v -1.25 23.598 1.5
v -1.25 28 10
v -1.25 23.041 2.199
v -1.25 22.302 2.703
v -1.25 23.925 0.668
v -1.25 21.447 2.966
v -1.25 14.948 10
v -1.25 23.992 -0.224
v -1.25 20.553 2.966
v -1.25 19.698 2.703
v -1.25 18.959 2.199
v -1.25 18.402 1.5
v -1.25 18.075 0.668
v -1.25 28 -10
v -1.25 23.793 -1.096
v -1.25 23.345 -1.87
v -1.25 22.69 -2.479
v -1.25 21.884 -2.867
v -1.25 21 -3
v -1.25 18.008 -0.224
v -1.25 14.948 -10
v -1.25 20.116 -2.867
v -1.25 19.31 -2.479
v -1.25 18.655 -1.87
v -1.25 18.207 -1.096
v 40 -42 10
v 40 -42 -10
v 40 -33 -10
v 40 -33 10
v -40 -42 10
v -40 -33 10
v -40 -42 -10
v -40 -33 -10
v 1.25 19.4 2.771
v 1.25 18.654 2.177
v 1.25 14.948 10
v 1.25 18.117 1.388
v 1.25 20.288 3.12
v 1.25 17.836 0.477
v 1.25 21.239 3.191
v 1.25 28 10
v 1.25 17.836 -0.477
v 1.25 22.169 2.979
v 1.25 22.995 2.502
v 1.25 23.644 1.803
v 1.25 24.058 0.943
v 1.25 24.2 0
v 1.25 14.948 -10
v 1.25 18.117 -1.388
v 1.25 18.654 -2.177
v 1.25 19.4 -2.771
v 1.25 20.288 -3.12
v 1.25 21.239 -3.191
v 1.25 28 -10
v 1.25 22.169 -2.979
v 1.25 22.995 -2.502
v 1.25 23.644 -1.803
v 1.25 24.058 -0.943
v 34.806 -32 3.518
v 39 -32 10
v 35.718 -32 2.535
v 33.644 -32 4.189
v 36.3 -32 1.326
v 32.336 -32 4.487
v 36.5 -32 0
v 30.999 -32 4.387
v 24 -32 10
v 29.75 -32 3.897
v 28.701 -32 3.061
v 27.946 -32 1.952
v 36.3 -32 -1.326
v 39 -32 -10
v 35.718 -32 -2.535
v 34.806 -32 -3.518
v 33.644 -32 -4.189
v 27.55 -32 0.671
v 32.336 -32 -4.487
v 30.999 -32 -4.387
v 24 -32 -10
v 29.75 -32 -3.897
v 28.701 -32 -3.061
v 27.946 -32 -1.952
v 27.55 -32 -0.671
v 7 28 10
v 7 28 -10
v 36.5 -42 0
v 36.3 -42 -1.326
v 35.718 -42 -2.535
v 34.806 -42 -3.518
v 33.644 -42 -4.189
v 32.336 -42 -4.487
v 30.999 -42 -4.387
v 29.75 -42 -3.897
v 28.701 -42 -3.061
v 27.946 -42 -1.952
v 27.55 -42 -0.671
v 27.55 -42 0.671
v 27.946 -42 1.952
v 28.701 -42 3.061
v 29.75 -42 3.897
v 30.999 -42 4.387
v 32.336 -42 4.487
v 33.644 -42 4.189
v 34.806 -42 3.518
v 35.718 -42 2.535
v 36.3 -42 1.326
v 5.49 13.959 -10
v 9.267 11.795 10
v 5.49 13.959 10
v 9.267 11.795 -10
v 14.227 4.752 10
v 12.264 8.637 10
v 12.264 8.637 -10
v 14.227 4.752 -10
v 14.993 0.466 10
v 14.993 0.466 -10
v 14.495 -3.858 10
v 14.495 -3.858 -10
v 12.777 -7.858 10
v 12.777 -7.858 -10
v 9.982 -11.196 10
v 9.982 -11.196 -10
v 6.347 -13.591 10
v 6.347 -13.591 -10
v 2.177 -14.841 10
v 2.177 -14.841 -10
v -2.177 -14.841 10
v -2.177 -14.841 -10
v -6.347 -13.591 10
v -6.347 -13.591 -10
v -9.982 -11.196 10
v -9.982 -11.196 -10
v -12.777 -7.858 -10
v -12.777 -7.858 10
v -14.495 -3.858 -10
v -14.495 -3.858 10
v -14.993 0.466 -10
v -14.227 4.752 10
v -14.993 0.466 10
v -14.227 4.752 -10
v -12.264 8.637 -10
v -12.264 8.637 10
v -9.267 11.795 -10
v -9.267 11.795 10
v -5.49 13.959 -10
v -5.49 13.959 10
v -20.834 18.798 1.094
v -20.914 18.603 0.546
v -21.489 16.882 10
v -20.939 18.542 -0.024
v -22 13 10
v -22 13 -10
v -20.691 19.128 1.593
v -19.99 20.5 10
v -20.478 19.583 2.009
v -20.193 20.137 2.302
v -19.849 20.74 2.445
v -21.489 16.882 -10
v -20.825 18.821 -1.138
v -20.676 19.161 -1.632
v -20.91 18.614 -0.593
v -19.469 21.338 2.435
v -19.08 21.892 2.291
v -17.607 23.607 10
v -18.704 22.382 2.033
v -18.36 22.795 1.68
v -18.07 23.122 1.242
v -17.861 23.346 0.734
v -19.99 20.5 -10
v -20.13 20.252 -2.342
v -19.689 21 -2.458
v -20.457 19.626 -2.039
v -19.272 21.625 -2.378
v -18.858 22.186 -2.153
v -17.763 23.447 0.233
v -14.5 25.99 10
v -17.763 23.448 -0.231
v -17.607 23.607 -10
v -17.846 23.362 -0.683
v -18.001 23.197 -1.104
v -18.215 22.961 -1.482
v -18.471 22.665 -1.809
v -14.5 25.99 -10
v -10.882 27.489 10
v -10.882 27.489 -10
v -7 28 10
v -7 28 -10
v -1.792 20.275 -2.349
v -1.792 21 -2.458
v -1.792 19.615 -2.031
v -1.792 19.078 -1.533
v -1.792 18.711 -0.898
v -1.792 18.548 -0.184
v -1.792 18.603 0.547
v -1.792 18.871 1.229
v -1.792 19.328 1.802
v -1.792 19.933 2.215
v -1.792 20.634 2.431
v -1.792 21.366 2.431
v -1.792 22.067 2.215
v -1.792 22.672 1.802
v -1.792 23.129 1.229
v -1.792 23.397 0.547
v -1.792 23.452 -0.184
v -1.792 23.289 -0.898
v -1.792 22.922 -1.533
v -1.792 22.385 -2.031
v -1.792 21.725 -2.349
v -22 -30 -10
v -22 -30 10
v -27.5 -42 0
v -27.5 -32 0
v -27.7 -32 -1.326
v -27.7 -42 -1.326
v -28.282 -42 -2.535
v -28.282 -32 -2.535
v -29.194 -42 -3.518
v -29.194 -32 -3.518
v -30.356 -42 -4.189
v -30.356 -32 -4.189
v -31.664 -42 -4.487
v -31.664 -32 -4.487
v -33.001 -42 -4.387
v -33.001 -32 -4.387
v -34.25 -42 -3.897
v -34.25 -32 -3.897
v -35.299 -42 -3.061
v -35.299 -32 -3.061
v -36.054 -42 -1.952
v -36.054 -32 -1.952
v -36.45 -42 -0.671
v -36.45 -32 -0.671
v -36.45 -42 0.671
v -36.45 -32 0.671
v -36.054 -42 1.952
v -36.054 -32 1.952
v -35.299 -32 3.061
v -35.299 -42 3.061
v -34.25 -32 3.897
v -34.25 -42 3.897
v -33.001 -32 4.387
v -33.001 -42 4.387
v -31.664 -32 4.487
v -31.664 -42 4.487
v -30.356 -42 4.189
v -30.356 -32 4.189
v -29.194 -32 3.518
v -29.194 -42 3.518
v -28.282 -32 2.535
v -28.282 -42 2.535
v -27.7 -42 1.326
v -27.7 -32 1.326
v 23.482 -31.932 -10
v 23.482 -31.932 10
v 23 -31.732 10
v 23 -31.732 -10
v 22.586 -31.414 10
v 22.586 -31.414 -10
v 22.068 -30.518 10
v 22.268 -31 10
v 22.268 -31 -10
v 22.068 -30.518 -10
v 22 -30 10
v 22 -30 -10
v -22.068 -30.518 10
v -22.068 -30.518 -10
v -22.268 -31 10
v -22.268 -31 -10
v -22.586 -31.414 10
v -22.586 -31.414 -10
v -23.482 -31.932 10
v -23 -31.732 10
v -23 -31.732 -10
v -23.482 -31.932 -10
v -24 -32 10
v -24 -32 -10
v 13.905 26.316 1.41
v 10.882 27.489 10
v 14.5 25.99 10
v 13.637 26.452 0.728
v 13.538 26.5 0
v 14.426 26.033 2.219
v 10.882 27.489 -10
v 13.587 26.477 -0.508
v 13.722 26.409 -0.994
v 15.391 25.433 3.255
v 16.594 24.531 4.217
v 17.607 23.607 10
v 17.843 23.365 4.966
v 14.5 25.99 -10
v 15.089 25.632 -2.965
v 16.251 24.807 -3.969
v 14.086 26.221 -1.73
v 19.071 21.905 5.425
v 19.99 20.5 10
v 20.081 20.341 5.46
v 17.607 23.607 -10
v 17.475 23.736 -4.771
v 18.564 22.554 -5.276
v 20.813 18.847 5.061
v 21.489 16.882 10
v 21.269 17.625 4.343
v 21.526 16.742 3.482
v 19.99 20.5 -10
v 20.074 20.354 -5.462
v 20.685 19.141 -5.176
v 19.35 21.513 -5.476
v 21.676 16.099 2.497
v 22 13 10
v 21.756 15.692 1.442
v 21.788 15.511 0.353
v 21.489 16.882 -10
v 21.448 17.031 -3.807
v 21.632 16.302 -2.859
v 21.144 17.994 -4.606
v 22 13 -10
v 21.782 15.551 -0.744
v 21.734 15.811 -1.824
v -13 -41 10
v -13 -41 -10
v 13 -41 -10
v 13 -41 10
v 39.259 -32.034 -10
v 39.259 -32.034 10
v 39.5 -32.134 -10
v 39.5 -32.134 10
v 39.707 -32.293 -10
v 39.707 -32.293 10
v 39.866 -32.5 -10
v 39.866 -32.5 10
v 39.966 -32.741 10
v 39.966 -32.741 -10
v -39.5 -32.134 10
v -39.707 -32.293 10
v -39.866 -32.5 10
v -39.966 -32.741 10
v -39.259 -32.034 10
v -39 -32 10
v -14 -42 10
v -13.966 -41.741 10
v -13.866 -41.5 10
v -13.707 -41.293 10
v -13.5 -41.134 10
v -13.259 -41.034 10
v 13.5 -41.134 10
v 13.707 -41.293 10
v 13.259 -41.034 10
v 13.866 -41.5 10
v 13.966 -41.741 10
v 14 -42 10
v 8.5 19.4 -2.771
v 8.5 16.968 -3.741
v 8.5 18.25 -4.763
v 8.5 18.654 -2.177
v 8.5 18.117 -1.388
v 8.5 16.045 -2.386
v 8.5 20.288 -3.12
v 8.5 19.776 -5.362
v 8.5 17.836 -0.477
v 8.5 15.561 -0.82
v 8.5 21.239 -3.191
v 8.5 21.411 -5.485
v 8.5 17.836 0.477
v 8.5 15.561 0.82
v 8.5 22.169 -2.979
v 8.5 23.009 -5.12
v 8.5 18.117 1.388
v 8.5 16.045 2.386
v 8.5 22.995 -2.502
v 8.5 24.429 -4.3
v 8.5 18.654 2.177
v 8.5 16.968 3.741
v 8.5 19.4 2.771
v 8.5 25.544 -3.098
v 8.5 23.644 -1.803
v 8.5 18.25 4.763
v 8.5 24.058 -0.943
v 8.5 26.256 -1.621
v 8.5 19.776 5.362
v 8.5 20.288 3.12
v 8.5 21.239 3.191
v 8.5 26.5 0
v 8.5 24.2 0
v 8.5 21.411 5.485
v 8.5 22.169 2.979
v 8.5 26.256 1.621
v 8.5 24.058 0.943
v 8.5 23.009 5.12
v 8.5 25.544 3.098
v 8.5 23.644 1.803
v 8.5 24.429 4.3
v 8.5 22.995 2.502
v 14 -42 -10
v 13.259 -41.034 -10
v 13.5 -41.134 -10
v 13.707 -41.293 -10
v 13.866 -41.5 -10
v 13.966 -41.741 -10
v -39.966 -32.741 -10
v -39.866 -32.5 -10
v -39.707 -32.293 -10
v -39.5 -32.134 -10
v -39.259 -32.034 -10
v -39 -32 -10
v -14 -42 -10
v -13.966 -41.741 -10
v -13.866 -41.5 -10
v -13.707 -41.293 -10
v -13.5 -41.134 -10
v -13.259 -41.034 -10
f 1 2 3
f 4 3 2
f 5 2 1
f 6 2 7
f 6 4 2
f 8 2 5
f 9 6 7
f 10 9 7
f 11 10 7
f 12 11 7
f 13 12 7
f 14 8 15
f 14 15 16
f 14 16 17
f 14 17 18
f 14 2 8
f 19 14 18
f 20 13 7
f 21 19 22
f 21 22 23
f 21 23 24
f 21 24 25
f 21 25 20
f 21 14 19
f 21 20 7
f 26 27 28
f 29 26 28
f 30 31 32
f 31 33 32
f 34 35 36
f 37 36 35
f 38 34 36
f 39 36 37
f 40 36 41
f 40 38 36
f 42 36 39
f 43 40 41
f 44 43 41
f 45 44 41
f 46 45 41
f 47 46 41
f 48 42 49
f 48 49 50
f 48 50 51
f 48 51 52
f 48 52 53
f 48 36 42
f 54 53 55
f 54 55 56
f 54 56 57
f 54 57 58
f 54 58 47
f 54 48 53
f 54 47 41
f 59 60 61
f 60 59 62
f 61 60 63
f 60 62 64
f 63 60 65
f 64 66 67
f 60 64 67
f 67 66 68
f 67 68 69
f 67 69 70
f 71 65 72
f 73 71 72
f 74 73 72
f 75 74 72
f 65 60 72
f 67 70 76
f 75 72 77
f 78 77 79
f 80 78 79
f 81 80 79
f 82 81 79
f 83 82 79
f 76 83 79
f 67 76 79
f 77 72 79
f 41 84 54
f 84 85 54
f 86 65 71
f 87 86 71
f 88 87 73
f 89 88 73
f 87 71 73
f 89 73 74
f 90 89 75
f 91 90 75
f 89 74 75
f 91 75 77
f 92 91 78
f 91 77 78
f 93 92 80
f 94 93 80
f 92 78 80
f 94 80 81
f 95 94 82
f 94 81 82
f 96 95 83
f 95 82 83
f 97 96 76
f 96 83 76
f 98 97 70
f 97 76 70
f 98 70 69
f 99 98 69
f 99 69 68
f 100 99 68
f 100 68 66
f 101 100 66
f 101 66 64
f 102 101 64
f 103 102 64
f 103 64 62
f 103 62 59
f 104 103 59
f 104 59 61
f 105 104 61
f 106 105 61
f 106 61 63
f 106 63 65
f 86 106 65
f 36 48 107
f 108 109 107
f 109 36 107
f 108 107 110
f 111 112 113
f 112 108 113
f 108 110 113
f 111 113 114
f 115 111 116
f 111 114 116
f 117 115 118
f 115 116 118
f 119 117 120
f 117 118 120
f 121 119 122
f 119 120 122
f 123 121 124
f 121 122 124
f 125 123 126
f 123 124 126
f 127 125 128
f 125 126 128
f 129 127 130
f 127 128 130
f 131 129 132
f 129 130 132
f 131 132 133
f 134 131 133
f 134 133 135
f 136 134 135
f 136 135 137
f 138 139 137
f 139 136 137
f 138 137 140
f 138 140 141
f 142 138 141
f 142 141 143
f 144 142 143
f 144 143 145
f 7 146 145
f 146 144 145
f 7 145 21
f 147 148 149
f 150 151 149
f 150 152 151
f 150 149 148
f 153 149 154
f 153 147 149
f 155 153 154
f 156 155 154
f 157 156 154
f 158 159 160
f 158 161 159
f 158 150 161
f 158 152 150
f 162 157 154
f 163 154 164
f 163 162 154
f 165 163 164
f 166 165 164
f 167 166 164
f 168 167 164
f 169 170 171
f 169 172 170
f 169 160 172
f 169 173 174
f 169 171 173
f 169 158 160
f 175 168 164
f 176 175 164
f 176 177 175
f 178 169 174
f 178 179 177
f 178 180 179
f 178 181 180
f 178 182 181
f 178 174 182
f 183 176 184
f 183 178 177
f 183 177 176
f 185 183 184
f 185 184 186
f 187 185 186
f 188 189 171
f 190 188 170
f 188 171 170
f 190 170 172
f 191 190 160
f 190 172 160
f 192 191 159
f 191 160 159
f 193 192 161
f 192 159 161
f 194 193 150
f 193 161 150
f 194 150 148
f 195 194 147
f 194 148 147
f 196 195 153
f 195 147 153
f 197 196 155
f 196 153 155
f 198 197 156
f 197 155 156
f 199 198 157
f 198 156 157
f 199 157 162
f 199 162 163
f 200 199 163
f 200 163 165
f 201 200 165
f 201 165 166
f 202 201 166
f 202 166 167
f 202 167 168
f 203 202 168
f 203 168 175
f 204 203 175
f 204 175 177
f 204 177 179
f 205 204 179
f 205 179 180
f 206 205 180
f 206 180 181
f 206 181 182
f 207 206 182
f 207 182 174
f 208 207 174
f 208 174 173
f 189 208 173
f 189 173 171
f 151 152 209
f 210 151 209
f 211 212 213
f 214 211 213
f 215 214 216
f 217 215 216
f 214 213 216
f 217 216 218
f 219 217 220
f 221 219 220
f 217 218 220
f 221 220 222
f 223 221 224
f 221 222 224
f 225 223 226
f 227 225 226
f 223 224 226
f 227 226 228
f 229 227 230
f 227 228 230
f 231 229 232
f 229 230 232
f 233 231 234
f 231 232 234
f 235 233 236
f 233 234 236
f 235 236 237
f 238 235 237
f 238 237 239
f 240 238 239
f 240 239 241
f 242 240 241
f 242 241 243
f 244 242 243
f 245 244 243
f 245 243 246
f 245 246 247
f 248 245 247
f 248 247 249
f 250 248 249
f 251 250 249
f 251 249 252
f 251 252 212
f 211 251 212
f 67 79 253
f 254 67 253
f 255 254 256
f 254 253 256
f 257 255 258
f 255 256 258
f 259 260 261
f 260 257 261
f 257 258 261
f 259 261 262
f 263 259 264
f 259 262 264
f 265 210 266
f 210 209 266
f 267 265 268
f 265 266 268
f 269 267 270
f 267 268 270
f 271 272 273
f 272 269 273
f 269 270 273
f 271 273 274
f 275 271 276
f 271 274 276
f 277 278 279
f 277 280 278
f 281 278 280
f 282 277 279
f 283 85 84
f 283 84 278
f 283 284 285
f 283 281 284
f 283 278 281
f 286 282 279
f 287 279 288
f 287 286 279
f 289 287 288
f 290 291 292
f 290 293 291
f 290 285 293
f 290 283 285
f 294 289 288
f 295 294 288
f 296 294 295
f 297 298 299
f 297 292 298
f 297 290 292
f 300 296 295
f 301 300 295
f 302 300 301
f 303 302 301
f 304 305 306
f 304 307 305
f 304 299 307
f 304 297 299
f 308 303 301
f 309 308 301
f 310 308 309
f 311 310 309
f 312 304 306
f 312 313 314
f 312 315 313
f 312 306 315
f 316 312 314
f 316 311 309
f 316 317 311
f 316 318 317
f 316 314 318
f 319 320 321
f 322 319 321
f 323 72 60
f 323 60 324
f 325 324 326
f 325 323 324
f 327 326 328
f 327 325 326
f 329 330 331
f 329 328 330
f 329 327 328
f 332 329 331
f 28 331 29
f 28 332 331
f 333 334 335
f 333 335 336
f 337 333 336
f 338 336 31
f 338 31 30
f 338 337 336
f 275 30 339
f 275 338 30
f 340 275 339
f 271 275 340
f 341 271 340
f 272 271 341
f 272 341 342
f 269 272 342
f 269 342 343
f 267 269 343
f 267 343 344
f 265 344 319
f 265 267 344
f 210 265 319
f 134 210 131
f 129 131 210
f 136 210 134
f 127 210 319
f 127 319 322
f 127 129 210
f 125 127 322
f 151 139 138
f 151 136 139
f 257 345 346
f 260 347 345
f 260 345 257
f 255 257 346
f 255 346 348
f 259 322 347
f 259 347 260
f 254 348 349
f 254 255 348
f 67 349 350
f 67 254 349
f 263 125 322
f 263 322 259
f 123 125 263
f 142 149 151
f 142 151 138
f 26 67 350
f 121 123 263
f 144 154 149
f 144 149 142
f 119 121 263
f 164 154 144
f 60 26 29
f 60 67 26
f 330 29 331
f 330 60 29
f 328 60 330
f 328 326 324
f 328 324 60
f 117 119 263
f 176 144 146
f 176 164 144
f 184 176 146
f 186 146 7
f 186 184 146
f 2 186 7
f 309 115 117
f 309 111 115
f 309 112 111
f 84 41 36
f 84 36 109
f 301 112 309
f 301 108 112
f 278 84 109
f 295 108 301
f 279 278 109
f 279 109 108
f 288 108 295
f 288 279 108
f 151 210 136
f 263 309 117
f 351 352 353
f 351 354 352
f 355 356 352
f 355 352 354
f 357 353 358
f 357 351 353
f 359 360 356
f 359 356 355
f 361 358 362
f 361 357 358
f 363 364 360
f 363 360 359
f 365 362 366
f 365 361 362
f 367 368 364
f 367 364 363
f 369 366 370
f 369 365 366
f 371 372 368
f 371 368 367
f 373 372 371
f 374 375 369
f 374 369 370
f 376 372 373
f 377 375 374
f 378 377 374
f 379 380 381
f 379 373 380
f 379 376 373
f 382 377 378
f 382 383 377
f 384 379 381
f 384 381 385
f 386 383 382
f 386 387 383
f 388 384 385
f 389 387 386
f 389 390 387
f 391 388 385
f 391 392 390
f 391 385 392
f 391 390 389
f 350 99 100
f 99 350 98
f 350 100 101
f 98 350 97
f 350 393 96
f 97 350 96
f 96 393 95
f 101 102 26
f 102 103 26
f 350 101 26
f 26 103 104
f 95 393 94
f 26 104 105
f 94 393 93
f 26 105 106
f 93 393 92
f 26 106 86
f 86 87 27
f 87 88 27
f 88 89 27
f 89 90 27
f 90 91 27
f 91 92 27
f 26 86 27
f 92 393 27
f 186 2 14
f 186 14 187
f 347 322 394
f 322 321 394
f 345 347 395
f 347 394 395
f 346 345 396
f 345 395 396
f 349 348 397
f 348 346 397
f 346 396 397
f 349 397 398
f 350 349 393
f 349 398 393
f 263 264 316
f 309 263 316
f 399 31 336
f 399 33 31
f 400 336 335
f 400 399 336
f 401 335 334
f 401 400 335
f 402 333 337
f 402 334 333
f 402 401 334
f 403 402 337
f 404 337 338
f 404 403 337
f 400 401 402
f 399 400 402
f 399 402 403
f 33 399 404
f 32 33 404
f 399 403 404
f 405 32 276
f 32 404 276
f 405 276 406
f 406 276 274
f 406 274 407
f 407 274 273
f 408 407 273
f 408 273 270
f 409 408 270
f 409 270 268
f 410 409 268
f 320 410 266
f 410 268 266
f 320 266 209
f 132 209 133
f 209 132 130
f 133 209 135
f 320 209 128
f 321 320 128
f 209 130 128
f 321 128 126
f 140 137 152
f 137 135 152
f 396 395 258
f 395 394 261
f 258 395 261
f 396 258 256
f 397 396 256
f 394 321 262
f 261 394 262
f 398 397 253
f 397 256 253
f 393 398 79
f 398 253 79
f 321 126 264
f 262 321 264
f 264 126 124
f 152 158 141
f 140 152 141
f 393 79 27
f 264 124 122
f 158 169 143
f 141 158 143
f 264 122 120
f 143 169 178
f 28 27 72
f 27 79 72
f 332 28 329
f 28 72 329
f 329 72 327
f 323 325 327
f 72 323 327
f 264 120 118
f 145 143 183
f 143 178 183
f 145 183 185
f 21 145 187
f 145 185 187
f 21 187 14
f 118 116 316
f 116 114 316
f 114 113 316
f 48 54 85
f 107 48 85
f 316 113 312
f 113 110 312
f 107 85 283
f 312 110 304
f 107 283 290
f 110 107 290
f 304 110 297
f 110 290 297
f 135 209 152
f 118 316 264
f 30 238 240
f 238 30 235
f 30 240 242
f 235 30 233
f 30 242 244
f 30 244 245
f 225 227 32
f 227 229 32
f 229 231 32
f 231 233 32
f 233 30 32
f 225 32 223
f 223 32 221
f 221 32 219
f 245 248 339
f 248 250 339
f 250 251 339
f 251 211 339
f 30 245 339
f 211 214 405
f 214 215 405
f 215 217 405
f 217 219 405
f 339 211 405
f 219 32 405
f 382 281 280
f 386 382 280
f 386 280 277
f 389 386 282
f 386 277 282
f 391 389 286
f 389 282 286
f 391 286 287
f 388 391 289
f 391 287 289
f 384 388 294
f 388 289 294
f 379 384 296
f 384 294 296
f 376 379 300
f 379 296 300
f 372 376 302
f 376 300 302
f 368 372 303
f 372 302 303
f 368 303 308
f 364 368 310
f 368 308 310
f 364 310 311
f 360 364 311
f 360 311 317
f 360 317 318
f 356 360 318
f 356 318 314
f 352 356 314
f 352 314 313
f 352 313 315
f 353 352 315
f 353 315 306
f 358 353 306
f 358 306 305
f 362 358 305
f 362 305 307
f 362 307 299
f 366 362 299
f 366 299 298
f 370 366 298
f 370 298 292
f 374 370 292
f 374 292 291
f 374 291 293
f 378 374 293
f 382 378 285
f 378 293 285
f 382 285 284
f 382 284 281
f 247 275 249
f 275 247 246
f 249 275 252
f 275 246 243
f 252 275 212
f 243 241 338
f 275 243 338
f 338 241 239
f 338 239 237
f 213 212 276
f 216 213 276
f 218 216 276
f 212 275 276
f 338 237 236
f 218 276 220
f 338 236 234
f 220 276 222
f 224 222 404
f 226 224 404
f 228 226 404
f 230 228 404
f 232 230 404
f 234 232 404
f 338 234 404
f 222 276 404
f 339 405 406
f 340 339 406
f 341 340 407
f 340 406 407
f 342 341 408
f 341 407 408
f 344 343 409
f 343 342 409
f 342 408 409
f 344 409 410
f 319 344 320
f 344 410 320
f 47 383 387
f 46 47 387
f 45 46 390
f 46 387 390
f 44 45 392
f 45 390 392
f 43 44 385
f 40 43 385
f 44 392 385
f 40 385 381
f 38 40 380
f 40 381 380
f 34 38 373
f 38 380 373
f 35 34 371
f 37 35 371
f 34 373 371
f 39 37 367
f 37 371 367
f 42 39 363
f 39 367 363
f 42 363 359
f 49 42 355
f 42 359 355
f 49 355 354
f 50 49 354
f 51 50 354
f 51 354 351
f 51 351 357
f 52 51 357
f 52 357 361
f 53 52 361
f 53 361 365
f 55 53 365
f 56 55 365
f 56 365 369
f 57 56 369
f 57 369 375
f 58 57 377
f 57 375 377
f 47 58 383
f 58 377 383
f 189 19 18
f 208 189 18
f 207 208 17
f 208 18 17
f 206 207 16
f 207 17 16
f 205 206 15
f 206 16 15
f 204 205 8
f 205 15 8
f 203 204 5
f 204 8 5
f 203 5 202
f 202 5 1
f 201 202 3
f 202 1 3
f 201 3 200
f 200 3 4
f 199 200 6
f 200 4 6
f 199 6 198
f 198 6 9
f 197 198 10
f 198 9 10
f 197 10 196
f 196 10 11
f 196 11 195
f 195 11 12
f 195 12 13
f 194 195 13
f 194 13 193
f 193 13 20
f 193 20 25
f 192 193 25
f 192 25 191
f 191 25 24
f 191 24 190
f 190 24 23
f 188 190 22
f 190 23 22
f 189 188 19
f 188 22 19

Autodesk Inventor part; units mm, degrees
sketch "_____1" plane through (0, 0, 0) normal (0, 0, 1) x (1, 0, 0)
  line L0 (-40, -33) -> (-40, -42)
  line L1 (-40, -42) -> (-14, -42)
  arc A0 (-13, -41) -> (-14, -42) centre (-13, -42) ccw
  line L2 (-13, -41) -> (13, -41)
  arc A1 (14, -42) -> (13, -41) centre (13, -42) ccw
  line L3 (14, -42) -> (40, -42)
  line L4 (40, -42) -> (40, -33)
  arc A2 (40, -33) -> (39, -32) centre (39, -33) ccw
  line L5 (39, -32) -> (24, -32)
  arc A3 (22, -30) -> (24, -32) centre (24, -30) ccw
  line L6 (22, -30) -> (22, 13)
  arc A4 (22, 13) -> (7, 28) centre (7, 13) ccw
  line L7 (7, 28) -> (-7, 28)
  arc A5 (-7, 28) -> (-22, 13) centre (-7, 13) ccw
  line L8 (-22, 13) -> (-22, -30)
  arc A6 (-24, -32) -> (-22, -30) centre (-24, -30) ccw
  line L9 (-24, -32) -> (-39, -32)
  arc A7 (-39, -32) -> (-40, -33) centre (-39, -33) ccw
extrude "Extrusion1" add sketch "_____1" along normal mid plane 20
sketch "_____2" plane through (0, 0, 0) normal (0, 0, 1) x (1, 0, 0)
  arc A0 (-1.25, 14.9478) -> (1.25, 14.9478) centre (0, 0) ccw
  line L0 (1.25, 14.9478) -> (1.25, 70)
  line L1 (1.25, 70) -> (-1.25, 70)
  line L2 (-1.25, 70) -> (-1.25, 14.9478)
extrude "Extrusion2" cut sketch "_____2" along normal mid plane 20
sketch "_____3" plane through (0, 0, 0) normal (0, 1, 0) x (1, 0, 0)
  circle A0 centre (32, 0) radius 4.5
extrude "Extrusion3" cut sketch "_____3" against normal blind 42
sketch "_____4" plane through (0, 0, 0) normal (0, 1, 0) x (1, 0, 0)
  circle A0 centre (-32, 0) radius 4.5
extrude "Extrusion4" cut sketch "_____4" against normal blind 42
sketch "_____5" plane through (0, 0, 0) normal (0, 0, 1) x (1, 0, 0)
  line L0 (50, 21) -> (-50, 21)
  line L1 (0, 21) -> (0, 24.2)
  line L2 (0, 24.2) -> (8.5, 24.2)
  line L3 (8.5, 24.2) -> (8.5, 26.5)
  line L4 (8.5, 26.5) -> (22, 26.5)
  line L5 (22, 26.5) -> (22, 21)
  line L6 (22, 21) -> (0, 21)
revolve "Revolution1" cut sketch "_____5" angle 360 about axis through (50, 21, 0) along (1, 0, 0)
sketch "Sketch6" plane through (-1.25, 14.9478, 10) normal (1, 0, 0) x (0, 0, -1)
  point P0 (10, 6.0522)
hole "Hole1" at (-1.25, 21, 0) direction (-1, 0, 0) diameter 4.917 depth 20.75 countersink diameter 6 countersink angle 90 thread size "M6x1" class "6H" standard "ISO Metric profile"
ref_plane "to_bolt_XY" through (8.5, 21, 0) normal (1, 0, 0) x (0, 0, -1)
ref_plane "to_bolt_YZ" through (8.5, 21, 0) normal (0, 0, -1) x (0, 1, 0)
ref_plane "to_bolt_ZX" through (8.5, 21, 0) normal (0, 1, 0) x (1, 0, 0)
properties part number "C-SHA30_b"
